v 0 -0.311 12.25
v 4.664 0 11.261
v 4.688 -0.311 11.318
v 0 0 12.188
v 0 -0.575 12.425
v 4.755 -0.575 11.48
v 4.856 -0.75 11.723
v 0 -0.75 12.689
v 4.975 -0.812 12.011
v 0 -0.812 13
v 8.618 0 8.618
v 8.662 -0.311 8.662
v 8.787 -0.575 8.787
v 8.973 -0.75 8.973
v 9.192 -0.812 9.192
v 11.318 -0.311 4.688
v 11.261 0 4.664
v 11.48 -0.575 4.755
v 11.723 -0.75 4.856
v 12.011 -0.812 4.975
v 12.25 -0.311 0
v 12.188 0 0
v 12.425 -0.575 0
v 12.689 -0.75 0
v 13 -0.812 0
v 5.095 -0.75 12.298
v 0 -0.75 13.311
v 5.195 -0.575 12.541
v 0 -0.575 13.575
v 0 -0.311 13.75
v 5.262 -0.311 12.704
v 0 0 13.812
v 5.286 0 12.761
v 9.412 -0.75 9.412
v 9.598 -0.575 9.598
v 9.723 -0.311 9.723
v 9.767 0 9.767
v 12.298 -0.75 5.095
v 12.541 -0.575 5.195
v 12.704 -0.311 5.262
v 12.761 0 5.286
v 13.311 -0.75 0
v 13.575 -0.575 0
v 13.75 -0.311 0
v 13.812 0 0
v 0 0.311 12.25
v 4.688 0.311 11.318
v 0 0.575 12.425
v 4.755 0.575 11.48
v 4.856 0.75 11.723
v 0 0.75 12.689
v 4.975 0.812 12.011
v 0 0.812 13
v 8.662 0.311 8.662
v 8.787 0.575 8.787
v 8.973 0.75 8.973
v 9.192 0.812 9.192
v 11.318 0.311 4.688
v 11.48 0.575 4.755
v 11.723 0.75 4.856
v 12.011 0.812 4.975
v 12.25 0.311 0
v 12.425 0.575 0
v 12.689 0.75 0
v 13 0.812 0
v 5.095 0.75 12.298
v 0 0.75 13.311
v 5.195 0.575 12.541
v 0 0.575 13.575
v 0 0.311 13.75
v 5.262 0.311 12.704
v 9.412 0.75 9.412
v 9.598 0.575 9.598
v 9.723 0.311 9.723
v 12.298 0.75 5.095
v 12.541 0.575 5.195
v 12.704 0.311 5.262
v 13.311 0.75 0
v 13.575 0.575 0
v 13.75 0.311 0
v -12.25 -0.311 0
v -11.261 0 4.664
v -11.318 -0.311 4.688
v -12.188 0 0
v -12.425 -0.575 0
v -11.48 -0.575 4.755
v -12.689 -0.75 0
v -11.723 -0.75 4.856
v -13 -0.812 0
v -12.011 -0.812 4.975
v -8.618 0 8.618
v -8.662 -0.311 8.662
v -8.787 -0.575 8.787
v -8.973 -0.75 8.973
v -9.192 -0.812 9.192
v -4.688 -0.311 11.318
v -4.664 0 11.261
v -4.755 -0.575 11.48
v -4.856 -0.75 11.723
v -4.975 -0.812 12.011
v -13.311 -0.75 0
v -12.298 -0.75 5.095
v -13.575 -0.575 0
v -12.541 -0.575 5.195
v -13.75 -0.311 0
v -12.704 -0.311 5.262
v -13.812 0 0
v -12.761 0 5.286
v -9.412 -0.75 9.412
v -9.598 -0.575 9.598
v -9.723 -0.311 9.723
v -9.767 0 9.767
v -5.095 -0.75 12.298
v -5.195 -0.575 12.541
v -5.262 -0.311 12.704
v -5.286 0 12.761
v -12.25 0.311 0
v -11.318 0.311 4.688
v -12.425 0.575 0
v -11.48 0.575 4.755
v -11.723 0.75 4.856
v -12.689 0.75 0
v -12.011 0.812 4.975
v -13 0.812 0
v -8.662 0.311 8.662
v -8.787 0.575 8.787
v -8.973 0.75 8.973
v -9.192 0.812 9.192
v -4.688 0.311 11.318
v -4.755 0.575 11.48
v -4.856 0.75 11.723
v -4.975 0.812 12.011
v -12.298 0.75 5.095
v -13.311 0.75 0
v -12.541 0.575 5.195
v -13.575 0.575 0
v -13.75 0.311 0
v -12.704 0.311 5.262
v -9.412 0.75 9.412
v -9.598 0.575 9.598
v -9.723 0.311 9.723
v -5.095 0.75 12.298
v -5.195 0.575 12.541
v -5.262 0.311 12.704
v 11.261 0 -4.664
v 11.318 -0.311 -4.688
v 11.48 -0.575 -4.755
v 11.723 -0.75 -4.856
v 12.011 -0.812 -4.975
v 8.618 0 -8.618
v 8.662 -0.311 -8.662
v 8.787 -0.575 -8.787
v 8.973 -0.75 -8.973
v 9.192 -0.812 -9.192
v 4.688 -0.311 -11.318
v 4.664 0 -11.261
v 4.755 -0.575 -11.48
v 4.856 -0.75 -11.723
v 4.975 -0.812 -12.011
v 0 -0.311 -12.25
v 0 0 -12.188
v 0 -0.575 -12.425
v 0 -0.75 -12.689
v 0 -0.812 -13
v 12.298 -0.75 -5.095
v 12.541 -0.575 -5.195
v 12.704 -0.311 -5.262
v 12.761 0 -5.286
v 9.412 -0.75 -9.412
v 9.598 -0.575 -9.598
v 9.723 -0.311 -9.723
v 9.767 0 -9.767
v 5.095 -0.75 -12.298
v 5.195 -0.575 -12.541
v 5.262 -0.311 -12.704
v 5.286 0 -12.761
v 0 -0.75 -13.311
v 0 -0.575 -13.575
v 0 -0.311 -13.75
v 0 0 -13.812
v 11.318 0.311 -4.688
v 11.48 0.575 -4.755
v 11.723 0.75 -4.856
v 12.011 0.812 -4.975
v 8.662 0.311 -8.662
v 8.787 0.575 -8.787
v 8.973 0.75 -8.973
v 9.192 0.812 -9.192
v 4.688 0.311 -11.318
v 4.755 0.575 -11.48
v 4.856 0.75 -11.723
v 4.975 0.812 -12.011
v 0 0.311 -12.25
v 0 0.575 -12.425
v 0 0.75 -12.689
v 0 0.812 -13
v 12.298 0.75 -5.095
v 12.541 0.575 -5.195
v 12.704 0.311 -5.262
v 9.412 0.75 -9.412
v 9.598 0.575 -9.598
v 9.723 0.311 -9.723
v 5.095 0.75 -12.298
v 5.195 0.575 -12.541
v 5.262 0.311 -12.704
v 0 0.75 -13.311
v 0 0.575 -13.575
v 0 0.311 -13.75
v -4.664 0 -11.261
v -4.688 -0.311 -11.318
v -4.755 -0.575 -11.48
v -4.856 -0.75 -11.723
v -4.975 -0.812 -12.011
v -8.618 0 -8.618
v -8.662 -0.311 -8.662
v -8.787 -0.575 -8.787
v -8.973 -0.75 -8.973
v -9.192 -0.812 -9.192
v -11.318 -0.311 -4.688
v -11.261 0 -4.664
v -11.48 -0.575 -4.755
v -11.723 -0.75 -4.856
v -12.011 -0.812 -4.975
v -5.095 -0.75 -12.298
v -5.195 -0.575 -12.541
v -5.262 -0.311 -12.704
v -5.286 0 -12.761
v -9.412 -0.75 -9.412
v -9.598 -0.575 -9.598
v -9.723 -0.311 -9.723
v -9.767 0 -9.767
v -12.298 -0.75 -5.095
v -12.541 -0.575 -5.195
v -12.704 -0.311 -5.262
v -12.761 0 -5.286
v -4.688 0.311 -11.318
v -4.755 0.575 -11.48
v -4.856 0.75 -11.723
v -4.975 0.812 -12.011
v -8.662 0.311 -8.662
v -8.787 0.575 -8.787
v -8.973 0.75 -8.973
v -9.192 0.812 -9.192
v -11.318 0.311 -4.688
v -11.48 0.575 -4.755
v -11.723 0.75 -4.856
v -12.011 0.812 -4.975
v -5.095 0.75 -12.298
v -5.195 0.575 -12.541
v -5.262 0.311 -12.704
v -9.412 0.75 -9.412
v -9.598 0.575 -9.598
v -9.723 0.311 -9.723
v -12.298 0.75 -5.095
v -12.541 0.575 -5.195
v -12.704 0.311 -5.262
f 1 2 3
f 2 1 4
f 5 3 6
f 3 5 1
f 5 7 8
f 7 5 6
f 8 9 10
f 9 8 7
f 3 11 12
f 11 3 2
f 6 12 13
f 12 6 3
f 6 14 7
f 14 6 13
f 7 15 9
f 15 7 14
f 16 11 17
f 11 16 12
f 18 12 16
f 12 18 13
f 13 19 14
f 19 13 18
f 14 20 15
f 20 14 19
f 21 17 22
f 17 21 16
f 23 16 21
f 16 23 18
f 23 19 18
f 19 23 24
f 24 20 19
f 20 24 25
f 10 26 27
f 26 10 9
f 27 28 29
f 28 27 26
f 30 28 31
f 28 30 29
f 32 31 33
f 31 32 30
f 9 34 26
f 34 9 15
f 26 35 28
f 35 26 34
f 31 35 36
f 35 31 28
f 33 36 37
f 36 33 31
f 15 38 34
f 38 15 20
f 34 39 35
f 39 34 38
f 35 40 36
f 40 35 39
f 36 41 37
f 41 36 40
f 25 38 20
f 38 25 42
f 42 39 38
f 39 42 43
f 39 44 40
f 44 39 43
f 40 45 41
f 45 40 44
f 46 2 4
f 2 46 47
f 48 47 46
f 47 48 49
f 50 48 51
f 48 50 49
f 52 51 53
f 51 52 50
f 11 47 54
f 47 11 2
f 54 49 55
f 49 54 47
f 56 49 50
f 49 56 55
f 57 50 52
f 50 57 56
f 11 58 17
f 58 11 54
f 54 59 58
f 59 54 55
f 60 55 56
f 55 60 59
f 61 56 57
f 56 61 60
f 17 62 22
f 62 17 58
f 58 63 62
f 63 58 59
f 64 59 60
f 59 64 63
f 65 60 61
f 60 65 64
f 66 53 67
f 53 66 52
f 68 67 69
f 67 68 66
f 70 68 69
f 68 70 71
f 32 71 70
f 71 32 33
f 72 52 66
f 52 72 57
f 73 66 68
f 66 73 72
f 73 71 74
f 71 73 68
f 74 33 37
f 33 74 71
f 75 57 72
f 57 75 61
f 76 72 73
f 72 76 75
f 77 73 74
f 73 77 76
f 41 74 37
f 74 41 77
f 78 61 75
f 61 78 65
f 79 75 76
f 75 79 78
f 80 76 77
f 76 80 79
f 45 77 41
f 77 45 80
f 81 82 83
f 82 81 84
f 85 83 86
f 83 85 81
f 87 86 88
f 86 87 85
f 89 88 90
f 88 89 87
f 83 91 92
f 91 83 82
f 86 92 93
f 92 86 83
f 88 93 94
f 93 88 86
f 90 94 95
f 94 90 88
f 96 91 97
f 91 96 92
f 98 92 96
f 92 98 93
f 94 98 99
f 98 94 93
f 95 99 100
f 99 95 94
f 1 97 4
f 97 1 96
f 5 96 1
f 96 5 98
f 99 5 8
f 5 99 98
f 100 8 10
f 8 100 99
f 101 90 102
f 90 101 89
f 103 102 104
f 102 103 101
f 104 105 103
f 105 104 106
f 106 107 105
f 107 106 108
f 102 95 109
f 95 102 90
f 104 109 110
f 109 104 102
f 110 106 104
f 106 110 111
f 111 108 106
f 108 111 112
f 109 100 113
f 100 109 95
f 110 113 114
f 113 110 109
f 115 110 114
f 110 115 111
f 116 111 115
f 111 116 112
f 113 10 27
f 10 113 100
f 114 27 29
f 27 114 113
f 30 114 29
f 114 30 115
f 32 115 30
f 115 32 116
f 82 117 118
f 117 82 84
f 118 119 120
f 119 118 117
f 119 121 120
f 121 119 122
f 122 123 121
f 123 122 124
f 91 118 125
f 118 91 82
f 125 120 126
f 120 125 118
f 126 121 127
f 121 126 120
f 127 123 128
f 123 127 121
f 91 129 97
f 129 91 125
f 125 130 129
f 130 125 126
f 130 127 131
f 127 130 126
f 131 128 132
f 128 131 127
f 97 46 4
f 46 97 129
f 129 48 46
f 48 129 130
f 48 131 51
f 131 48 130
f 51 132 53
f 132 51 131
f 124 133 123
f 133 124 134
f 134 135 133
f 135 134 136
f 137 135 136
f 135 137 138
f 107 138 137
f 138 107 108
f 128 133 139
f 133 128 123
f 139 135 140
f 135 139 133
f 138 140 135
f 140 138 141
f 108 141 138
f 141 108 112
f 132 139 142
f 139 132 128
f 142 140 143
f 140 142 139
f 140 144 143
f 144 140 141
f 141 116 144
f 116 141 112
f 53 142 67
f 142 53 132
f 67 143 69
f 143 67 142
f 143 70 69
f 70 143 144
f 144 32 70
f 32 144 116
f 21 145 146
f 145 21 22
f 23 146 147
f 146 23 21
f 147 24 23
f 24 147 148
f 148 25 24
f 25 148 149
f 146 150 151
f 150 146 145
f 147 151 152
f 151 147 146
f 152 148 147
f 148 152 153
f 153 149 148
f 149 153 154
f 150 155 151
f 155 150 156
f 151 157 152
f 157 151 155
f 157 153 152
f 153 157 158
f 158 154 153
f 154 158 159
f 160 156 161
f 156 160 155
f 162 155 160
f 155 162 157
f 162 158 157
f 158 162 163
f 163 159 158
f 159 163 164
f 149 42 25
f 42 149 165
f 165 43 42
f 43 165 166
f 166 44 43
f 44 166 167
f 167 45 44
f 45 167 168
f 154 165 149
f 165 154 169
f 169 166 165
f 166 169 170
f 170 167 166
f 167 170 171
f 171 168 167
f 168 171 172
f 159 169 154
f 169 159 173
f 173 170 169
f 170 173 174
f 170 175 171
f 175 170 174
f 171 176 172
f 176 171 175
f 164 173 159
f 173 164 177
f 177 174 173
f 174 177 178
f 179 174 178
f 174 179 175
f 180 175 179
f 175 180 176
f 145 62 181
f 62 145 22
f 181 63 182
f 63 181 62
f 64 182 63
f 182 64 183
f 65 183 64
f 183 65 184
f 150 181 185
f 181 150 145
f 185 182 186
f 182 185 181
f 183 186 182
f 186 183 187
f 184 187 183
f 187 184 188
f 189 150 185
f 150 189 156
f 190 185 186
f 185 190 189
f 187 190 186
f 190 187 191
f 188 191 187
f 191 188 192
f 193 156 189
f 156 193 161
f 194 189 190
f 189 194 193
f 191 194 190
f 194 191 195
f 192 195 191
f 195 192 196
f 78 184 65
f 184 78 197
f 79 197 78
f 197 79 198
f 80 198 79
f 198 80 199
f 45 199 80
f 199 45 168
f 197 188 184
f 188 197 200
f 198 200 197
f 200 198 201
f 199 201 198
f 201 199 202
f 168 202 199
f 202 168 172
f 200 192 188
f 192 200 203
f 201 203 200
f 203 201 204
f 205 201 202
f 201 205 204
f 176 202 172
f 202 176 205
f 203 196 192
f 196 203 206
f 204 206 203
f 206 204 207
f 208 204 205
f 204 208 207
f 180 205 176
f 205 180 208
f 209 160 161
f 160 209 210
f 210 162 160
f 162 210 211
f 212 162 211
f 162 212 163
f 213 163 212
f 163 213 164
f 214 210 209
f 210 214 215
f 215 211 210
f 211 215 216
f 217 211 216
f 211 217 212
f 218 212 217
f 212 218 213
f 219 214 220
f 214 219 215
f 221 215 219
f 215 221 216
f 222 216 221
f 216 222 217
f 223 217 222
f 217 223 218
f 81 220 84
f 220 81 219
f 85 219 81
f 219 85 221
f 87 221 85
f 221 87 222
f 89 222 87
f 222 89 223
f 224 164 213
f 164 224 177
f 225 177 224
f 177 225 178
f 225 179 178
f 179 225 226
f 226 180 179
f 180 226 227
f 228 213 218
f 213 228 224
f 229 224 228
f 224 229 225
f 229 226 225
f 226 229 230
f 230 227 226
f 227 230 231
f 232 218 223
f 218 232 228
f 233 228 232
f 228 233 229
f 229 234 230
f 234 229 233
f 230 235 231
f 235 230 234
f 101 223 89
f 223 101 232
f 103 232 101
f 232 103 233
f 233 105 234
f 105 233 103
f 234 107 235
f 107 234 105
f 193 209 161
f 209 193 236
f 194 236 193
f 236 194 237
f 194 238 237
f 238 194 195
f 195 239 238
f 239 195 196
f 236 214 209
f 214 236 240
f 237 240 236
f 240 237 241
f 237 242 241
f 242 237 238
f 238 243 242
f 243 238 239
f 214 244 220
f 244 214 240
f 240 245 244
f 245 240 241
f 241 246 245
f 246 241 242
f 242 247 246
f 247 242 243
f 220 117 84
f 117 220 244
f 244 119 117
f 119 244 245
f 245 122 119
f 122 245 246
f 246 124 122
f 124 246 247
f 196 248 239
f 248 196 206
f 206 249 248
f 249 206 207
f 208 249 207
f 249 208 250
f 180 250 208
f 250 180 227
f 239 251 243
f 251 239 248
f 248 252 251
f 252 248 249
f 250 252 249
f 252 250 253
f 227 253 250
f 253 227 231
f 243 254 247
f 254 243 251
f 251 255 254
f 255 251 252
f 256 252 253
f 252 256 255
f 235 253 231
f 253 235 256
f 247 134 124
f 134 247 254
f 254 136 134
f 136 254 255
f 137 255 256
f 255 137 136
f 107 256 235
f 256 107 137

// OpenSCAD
// file: ../p/t04q0625.scad
use <../lib.scad>
use <t04i0625.scad>
use <t04o0625.scad>
function ldraw_lib__t04q0625() = [
// 0 Torus Tube  1 x 0.0625 x 0.25
// 0 Name: t04q0625.dat
// 0 Author: Paul Easter [pneaster]
// 0 !LDRAW_ORG Primitive UPDATE 2013-02
// 0 !LICENSE Licensed under CC BY 4.0 : see CAreadme.txt
// 
// 0 BFC CERTIFY CCW
  [0,"BFC","CERTIFY"],
  [0,"BFC","CCW"],
// 
// 0 !HISTORY 2002-11-30 [PTadmin] Official Update 2002-05
// 0 !HISTORY 2002-12-31 [PTadmin] Official Update 2002-06
// 0 !HISTORY 2007-06-24 [PTadmin] Header formatted for Contributor Agreement
// 0 !HISTORY 2008-07-01 [PTadmin] Official Update 2008-01
// 0 !HISTORY 2012-02-22 [Philo] Changed to CCW
// 0 !HISTORY 2012-03-30 [PTadmin] Official Update 2012-01
// 0 !HISTORY 2013-11-10 [cwdee] Corrected description spacing
// 0 !HISTORY 2013-12-23 [PTadmin] Official Update 2013-02
// 
// 
// 1 16 0 0 0 1 0 0 0 1 0 0 0 1 t04i0625.dat
  [1,16,0,0,0,1,0,0,0,1,0,0,0,1, ldraw_lib__t04i0625()],
// 1 16 0 0 0 1 0 0 0 1 0 0 0 1 t04o0625.dat
  [1,16,0,0,0,1,0,0,0,1,0,0,0,1, ldraw_lib__t04o0625()],
// 1 16 0 0 0 1 0 0 0 -1 0 0 0 1 t04i0625.dat
  [1,16,0,0,0,1,0,0,0,-1,0,0,0,1, ldraw_lib__t04i0625()],
// 1 16 0 0 0 1 0 0 0 -1 0 0 0 1 t04o0625.dat
  [1,16,0,0,0,1,0,0,0,-1,0,0,0,1, ldraw_lib__t04o0625()],
];
module ldraw_lib__t04q0625(step=0, col=false, unit=2/5, alt=false, line=0.2, solid=!$preview)
    makepoly(ldraw_lib__t04q0625(), step=step, col=col, unit=unit, alt=alt, line=line, solid=solid);
ldraw_lib__t04q0625(line=0.2);
// main file
use <../lib.scad>
use <../p/t04q0625.scad>
function ldraw_lib__85545() = [
// 0 Rubber Belt Round 26 /  1.6
// 0 Name: 85545.dat
// 0 Author: Philippe Hurbain [Philo]
// 0 !LDRAW_ORG Part UPDATE 2014-02
// 0 !LICENSE Licensed under CC BY 4.0 : see CAreadme.txt
// 
// 0 BFC CERTIFY CCW
  [0,"BFC","CERTIFY"],
  [0,"BFC","CCW"],
// 
// 0 !CATEGORY Technic
// 
// 0 !HISTORY 2014-12-23 [PTadmin] Official Update 2014-02
// 
// 
// 0 // Nomenclature: Rubber Belt [Round|Square] belt_diameter_(mm) / belt_thickness_(mm)
// 
// 1 16 0 0 0 0 0 32.5 -32.5 0 0 0 -32.5 0 t04q0625.dat
  [1,16,0,0,0,0,0,32.5,-32.5,0,0,0,-32.5,0, ldraw_lib__t04q0625()],
// 1 16 0 0 0 -32.5 0 0 0 0 -32.5 0 -32.5 0 t04q0625.dat
  [1,16,0,0,0,-32.5,0,0,0,0,-32.5,0,-32.5,0, ldraw_lib__t04q0625()],
// 1 16 0 0 0 32.5 0 0 0 0 32.5 0 -32.5 0 t04q0625.dat
  [1,16,0,0,0,32.5,0,0,0,0,32.5,0,-32.5,0, ldraw_lib__t04q0625()],
// 1 16 0 0 0 0 0 -32.5 32.5 0 0 0 -32.5 0 t04q0625.dat
  [1,16,0,0,0,0,0,-32.5,32.5,0,0,0,-32.5,0, ldraw_lib__t04q0625()],
];
module ldraw_lib__85545(step=0, col=false, unit=2/5, alt=false, line=0.2, solid=!$preview)
    makepoly(ldraw_lib__85545(), step=step, col=col, unit=unit, alt=alt, line=line, solid=solid);
ldraw_lib__85545(line=0.2);
